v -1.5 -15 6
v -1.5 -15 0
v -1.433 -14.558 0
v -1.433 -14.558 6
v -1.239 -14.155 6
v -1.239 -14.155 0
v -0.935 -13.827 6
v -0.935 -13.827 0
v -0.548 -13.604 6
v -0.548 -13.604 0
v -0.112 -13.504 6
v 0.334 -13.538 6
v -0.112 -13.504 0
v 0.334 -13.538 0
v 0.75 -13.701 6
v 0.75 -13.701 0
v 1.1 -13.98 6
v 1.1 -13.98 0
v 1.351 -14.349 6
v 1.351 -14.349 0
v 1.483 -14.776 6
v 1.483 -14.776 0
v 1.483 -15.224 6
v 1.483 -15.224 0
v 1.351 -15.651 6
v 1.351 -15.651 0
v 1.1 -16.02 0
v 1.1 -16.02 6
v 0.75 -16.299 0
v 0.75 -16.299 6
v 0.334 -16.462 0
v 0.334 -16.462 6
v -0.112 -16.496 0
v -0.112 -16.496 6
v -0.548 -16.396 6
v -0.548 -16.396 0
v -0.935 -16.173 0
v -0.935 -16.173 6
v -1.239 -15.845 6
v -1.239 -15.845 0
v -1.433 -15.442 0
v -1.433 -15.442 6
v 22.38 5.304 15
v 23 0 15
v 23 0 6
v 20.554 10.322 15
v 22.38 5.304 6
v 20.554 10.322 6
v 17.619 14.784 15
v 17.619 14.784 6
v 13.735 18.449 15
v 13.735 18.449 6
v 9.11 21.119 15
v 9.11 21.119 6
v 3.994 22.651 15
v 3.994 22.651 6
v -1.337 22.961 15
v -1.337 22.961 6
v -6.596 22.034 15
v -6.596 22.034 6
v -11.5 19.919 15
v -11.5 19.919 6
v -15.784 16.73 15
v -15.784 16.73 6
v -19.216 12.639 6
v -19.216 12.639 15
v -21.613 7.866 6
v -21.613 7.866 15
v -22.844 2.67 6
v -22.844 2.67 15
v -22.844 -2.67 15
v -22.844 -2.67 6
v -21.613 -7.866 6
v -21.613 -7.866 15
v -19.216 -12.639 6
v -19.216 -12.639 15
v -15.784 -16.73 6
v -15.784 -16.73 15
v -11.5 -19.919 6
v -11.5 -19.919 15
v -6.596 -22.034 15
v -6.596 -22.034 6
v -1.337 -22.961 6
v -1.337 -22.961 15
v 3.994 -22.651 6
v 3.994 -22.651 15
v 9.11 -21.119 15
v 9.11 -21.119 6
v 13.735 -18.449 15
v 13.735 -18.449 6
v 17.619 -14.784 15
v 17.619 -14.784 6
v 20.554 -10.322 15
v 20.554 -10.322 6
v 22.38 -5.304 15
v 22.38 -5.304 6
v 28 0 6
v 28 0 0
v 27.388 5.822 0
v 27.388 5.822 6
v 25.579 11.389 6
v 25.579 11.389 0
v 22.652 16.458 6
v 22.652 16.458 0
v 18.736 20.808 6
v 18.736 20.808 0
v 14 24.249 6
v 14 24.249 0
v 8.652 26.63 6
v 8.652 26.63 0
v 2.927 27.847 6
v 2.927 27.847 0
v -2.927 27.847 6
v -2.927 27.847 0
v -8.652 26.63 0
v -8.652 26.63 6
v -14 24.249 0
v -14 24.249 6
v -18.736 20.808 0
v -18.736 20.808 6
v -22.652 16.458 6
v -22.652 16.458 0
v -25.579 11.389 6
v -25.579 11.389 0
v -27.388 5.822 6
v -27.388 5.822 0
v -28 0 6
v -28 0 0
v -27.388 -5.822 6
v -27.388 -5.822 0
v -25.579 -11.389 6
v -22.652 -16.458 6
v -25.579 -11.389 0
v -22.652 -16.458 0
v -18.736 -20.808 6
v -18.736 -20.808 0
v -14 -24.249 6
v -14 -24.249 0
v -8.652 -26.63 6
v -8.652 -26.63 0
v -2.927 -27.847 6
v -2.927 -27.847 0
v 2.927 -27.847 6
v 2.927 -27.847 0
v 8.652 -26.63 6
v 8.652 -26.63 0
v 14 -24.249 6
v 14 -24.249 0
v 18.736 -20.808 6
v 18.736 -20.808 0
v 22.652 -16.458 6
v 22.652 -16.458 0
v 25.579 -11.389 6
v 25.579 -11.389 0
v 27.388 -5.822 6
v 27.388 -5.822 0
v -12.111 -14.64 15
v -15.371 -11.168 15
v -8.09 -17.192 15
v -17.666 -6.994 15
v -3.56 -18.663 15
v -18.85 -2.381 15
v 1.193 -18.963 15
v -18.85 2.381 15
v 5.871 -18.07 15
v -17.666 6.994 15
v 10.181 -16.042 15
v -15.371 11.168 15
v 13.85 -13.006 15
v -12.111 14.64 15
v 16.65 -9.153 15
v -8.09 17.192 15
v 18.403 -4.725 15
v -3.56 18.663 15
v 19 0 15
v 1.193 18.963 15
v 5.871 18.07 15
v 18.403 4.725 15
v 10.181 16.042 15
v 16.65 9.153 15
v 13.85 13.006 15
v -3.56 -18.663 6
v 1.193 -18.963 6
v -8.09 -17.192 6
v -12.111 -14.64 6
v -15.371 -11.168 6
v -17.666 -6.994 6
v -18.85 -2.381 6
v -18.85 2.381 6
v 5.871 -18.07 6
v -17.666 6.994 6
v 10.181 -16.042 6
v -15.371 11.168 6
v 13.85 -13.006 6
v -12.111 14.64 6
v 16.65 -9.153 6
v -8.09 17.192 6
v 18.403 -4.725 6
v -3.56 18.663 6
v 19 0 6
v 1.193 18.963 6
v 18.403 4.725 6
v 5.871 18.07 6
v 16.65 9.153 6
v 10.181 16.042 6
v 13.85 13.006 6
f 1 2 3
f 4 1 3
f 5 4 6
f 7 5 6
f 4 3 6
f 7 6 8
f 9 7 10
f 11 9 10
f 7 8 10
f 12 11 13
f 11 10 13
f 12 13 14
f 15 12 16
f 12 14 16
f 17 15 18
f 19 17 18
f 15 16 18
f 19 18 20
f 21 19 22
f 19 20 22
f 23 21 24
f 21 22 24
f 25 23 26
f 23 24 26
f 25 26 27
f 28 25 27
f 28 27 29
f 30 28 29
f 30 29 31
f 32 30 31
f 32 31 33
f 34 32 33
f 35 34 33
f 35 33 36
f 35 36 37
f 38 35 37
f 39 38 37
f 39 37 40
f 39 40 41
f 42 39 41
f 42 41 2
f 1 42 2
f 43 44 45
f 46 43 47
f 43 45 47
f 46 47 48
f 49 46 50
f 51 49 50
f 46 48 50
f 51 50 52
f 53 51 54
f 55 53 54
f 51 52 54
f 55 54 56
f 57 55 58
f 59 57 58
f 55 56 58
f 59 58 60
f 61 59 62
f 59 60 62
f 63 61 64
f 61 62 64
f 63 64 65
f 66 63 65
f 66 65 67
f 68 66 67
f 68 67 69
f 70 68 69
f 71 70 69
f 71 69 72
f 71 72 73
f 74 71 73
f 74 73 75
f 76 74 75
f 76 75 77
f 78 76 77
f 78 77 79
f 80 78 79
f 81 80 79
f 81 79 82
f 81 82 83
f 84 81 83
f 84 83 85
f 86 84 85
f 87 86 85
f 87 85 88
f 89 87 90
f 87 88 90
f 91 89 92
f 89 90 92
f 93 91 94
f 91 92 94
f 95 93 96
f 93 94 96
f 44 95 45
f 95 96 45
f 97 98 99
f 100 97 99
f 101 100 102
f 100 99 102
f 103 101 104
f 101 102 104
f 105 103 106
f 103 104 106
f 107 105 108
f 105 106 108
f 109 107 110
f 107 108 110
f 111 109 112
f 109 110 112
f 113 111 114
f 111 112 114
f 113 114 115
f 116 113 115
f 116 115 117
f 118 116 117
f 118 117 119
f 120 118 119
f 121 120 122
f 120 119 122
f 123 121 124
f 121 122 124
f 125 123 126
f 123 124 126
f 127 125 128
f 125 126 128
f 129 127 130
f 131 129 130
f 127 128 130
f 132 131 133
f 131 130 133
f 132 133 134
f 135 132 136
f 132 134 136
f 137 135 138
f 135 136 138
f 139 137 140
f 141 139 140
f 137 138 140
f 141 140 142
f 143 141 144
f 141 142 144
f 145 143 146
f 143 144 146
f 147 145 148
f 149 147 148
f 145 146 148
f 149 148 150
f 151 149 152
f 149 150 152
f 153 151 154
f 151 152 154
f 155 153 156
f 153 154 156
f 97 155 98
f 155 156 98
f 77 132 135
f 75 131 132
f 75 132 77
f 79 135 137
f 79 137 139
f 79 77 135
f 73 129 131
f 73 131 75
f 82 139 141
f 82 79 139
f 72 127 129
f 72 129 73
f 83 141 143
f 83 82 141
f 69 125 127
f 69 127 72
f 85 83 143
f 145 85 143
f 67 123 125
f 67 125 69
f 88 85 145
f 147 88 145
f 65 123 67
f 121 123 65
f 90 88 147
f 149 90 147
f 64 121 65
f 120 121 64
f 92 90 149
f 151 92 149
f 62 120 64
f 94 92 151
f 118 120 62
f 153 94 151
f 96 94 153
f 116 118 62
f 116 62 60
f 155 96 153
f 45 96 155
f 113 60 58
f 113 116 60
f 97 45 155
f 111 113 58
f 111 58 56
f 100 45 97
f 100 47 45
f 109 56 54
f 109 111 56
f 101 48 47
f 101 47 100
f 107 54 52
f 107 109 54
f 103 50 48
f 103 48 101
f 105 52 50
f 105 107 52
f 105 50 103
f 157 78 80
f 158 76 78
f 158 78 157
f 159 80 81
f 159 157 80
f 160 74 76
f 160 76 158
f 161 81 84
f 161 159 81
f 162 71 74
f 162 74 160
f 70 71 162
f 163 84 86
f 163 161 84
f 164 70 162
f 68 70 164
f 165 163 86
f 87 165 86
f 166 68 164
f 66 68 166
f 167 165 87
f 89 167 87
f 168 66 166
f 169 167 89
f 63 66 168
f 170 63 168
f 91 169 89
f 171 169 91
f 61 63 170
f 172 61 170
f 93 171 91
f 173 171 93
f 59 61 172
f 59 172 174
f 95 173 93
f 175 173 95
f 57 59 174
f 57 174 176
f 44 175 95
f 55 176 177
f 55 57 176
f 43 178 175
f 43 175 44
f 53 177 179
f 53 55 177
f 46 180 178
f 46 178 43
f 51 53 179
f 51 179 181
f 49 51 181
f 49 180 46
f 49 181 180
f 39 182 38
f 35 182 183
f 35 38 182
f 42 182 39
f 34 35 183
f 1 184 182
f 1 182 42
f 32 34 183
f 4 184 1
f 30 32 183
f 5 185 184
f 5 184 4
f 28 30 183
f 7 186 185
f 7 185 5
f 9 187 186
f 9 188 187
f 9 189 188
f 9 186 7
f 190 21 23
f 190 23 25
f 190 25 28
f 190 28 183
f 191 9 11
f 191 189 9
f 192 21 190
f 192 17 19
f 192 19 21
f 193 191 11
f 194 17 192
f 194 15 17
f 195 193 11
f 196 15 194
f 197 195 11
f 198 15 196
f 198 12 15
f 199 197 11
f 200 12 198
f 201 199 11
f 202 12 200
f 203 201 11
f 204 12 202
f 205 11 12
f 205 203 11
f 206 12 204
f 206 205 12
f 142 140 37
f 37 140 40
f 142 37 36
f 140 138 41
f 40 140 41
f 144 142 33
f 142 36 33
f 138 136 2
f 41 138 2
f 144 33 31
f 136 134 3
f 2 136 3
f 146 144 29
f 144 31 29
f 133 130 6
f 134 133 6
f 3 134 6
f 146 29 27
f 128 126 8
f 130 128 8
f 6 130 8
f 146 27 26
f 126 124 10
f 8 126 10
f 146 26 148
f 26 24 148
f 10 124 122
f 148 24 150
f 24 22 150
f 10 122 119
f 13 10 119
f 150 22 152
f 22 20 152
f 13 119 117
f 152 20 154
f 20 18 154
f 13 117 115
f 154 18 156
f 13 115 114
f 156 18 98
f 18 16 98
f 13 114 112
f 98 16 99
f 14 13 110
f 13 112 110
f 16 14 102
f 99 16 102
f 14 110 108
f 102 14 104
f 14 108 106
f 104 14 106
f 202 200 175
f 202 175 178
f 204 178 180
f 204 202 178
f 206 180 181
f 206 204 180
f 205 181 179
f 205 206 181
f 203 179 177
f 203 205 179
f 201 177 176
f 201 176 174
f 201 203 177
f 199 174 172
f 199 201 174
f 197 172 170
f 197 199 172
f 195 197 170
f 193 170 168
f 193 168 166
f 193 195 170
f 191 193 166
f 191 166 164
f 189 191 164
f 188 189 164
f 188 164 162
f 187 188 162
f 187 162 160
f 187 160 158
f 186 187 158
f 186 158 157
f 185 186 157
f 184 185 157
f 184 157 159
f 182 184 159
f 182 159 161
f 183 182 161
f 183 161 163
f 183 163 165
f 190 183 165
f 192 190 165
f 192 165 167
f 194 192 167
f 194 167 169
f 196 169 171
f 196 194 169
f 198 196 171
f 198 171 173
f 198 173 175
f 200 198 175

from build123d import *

# Parameters (mm, degrees)
SKETCH1_R           = 28
BOSS_EXTRUDE1_DEPTH = 6
SKETCH1_3_R         = 23
SKETCH1_3_R_2       = 19
BOSS_EXTRUDE2_DEPTH = 15
SKETCH2_R           = 1.5
CUT_EXTRUDE1_DEPTH  = 43.343830719


with BuildPart() as part:
    # Sketch1 → Boss-Extrude1 (new body)
    with BuildSketch(Plane.XY):
        Circle(SKETCH1_R)
    extrude(amount=BOSS_EXTRUDE1_DEPTH)

    # Sketch1<3> → Boss-Extrude2 (add)
    with BuildSketch(Plane.XY):
        Circle(SKETCH1_3_R)
        Circle(SKETCH1_3_R_2, mode=Mode.SUBTRACT)
    extrude(amount=BOSS_EXTRUDE2_DEPTH)

    # Sketch2 → Cut-Extrude1 (cut, through all)
    with BuildSketch(Plane(origin=(0, 0, 0), x_dir=(-1, 0, 0), z_dir=(0, 0, -1))):
        with Locations((0, -15)):
            Circle(SKETCH2_R)
    extrude(amount=-CUT_EXTRUDE1_DEPTH, mode=Mode.SUBTRACT)


solid = part.part
